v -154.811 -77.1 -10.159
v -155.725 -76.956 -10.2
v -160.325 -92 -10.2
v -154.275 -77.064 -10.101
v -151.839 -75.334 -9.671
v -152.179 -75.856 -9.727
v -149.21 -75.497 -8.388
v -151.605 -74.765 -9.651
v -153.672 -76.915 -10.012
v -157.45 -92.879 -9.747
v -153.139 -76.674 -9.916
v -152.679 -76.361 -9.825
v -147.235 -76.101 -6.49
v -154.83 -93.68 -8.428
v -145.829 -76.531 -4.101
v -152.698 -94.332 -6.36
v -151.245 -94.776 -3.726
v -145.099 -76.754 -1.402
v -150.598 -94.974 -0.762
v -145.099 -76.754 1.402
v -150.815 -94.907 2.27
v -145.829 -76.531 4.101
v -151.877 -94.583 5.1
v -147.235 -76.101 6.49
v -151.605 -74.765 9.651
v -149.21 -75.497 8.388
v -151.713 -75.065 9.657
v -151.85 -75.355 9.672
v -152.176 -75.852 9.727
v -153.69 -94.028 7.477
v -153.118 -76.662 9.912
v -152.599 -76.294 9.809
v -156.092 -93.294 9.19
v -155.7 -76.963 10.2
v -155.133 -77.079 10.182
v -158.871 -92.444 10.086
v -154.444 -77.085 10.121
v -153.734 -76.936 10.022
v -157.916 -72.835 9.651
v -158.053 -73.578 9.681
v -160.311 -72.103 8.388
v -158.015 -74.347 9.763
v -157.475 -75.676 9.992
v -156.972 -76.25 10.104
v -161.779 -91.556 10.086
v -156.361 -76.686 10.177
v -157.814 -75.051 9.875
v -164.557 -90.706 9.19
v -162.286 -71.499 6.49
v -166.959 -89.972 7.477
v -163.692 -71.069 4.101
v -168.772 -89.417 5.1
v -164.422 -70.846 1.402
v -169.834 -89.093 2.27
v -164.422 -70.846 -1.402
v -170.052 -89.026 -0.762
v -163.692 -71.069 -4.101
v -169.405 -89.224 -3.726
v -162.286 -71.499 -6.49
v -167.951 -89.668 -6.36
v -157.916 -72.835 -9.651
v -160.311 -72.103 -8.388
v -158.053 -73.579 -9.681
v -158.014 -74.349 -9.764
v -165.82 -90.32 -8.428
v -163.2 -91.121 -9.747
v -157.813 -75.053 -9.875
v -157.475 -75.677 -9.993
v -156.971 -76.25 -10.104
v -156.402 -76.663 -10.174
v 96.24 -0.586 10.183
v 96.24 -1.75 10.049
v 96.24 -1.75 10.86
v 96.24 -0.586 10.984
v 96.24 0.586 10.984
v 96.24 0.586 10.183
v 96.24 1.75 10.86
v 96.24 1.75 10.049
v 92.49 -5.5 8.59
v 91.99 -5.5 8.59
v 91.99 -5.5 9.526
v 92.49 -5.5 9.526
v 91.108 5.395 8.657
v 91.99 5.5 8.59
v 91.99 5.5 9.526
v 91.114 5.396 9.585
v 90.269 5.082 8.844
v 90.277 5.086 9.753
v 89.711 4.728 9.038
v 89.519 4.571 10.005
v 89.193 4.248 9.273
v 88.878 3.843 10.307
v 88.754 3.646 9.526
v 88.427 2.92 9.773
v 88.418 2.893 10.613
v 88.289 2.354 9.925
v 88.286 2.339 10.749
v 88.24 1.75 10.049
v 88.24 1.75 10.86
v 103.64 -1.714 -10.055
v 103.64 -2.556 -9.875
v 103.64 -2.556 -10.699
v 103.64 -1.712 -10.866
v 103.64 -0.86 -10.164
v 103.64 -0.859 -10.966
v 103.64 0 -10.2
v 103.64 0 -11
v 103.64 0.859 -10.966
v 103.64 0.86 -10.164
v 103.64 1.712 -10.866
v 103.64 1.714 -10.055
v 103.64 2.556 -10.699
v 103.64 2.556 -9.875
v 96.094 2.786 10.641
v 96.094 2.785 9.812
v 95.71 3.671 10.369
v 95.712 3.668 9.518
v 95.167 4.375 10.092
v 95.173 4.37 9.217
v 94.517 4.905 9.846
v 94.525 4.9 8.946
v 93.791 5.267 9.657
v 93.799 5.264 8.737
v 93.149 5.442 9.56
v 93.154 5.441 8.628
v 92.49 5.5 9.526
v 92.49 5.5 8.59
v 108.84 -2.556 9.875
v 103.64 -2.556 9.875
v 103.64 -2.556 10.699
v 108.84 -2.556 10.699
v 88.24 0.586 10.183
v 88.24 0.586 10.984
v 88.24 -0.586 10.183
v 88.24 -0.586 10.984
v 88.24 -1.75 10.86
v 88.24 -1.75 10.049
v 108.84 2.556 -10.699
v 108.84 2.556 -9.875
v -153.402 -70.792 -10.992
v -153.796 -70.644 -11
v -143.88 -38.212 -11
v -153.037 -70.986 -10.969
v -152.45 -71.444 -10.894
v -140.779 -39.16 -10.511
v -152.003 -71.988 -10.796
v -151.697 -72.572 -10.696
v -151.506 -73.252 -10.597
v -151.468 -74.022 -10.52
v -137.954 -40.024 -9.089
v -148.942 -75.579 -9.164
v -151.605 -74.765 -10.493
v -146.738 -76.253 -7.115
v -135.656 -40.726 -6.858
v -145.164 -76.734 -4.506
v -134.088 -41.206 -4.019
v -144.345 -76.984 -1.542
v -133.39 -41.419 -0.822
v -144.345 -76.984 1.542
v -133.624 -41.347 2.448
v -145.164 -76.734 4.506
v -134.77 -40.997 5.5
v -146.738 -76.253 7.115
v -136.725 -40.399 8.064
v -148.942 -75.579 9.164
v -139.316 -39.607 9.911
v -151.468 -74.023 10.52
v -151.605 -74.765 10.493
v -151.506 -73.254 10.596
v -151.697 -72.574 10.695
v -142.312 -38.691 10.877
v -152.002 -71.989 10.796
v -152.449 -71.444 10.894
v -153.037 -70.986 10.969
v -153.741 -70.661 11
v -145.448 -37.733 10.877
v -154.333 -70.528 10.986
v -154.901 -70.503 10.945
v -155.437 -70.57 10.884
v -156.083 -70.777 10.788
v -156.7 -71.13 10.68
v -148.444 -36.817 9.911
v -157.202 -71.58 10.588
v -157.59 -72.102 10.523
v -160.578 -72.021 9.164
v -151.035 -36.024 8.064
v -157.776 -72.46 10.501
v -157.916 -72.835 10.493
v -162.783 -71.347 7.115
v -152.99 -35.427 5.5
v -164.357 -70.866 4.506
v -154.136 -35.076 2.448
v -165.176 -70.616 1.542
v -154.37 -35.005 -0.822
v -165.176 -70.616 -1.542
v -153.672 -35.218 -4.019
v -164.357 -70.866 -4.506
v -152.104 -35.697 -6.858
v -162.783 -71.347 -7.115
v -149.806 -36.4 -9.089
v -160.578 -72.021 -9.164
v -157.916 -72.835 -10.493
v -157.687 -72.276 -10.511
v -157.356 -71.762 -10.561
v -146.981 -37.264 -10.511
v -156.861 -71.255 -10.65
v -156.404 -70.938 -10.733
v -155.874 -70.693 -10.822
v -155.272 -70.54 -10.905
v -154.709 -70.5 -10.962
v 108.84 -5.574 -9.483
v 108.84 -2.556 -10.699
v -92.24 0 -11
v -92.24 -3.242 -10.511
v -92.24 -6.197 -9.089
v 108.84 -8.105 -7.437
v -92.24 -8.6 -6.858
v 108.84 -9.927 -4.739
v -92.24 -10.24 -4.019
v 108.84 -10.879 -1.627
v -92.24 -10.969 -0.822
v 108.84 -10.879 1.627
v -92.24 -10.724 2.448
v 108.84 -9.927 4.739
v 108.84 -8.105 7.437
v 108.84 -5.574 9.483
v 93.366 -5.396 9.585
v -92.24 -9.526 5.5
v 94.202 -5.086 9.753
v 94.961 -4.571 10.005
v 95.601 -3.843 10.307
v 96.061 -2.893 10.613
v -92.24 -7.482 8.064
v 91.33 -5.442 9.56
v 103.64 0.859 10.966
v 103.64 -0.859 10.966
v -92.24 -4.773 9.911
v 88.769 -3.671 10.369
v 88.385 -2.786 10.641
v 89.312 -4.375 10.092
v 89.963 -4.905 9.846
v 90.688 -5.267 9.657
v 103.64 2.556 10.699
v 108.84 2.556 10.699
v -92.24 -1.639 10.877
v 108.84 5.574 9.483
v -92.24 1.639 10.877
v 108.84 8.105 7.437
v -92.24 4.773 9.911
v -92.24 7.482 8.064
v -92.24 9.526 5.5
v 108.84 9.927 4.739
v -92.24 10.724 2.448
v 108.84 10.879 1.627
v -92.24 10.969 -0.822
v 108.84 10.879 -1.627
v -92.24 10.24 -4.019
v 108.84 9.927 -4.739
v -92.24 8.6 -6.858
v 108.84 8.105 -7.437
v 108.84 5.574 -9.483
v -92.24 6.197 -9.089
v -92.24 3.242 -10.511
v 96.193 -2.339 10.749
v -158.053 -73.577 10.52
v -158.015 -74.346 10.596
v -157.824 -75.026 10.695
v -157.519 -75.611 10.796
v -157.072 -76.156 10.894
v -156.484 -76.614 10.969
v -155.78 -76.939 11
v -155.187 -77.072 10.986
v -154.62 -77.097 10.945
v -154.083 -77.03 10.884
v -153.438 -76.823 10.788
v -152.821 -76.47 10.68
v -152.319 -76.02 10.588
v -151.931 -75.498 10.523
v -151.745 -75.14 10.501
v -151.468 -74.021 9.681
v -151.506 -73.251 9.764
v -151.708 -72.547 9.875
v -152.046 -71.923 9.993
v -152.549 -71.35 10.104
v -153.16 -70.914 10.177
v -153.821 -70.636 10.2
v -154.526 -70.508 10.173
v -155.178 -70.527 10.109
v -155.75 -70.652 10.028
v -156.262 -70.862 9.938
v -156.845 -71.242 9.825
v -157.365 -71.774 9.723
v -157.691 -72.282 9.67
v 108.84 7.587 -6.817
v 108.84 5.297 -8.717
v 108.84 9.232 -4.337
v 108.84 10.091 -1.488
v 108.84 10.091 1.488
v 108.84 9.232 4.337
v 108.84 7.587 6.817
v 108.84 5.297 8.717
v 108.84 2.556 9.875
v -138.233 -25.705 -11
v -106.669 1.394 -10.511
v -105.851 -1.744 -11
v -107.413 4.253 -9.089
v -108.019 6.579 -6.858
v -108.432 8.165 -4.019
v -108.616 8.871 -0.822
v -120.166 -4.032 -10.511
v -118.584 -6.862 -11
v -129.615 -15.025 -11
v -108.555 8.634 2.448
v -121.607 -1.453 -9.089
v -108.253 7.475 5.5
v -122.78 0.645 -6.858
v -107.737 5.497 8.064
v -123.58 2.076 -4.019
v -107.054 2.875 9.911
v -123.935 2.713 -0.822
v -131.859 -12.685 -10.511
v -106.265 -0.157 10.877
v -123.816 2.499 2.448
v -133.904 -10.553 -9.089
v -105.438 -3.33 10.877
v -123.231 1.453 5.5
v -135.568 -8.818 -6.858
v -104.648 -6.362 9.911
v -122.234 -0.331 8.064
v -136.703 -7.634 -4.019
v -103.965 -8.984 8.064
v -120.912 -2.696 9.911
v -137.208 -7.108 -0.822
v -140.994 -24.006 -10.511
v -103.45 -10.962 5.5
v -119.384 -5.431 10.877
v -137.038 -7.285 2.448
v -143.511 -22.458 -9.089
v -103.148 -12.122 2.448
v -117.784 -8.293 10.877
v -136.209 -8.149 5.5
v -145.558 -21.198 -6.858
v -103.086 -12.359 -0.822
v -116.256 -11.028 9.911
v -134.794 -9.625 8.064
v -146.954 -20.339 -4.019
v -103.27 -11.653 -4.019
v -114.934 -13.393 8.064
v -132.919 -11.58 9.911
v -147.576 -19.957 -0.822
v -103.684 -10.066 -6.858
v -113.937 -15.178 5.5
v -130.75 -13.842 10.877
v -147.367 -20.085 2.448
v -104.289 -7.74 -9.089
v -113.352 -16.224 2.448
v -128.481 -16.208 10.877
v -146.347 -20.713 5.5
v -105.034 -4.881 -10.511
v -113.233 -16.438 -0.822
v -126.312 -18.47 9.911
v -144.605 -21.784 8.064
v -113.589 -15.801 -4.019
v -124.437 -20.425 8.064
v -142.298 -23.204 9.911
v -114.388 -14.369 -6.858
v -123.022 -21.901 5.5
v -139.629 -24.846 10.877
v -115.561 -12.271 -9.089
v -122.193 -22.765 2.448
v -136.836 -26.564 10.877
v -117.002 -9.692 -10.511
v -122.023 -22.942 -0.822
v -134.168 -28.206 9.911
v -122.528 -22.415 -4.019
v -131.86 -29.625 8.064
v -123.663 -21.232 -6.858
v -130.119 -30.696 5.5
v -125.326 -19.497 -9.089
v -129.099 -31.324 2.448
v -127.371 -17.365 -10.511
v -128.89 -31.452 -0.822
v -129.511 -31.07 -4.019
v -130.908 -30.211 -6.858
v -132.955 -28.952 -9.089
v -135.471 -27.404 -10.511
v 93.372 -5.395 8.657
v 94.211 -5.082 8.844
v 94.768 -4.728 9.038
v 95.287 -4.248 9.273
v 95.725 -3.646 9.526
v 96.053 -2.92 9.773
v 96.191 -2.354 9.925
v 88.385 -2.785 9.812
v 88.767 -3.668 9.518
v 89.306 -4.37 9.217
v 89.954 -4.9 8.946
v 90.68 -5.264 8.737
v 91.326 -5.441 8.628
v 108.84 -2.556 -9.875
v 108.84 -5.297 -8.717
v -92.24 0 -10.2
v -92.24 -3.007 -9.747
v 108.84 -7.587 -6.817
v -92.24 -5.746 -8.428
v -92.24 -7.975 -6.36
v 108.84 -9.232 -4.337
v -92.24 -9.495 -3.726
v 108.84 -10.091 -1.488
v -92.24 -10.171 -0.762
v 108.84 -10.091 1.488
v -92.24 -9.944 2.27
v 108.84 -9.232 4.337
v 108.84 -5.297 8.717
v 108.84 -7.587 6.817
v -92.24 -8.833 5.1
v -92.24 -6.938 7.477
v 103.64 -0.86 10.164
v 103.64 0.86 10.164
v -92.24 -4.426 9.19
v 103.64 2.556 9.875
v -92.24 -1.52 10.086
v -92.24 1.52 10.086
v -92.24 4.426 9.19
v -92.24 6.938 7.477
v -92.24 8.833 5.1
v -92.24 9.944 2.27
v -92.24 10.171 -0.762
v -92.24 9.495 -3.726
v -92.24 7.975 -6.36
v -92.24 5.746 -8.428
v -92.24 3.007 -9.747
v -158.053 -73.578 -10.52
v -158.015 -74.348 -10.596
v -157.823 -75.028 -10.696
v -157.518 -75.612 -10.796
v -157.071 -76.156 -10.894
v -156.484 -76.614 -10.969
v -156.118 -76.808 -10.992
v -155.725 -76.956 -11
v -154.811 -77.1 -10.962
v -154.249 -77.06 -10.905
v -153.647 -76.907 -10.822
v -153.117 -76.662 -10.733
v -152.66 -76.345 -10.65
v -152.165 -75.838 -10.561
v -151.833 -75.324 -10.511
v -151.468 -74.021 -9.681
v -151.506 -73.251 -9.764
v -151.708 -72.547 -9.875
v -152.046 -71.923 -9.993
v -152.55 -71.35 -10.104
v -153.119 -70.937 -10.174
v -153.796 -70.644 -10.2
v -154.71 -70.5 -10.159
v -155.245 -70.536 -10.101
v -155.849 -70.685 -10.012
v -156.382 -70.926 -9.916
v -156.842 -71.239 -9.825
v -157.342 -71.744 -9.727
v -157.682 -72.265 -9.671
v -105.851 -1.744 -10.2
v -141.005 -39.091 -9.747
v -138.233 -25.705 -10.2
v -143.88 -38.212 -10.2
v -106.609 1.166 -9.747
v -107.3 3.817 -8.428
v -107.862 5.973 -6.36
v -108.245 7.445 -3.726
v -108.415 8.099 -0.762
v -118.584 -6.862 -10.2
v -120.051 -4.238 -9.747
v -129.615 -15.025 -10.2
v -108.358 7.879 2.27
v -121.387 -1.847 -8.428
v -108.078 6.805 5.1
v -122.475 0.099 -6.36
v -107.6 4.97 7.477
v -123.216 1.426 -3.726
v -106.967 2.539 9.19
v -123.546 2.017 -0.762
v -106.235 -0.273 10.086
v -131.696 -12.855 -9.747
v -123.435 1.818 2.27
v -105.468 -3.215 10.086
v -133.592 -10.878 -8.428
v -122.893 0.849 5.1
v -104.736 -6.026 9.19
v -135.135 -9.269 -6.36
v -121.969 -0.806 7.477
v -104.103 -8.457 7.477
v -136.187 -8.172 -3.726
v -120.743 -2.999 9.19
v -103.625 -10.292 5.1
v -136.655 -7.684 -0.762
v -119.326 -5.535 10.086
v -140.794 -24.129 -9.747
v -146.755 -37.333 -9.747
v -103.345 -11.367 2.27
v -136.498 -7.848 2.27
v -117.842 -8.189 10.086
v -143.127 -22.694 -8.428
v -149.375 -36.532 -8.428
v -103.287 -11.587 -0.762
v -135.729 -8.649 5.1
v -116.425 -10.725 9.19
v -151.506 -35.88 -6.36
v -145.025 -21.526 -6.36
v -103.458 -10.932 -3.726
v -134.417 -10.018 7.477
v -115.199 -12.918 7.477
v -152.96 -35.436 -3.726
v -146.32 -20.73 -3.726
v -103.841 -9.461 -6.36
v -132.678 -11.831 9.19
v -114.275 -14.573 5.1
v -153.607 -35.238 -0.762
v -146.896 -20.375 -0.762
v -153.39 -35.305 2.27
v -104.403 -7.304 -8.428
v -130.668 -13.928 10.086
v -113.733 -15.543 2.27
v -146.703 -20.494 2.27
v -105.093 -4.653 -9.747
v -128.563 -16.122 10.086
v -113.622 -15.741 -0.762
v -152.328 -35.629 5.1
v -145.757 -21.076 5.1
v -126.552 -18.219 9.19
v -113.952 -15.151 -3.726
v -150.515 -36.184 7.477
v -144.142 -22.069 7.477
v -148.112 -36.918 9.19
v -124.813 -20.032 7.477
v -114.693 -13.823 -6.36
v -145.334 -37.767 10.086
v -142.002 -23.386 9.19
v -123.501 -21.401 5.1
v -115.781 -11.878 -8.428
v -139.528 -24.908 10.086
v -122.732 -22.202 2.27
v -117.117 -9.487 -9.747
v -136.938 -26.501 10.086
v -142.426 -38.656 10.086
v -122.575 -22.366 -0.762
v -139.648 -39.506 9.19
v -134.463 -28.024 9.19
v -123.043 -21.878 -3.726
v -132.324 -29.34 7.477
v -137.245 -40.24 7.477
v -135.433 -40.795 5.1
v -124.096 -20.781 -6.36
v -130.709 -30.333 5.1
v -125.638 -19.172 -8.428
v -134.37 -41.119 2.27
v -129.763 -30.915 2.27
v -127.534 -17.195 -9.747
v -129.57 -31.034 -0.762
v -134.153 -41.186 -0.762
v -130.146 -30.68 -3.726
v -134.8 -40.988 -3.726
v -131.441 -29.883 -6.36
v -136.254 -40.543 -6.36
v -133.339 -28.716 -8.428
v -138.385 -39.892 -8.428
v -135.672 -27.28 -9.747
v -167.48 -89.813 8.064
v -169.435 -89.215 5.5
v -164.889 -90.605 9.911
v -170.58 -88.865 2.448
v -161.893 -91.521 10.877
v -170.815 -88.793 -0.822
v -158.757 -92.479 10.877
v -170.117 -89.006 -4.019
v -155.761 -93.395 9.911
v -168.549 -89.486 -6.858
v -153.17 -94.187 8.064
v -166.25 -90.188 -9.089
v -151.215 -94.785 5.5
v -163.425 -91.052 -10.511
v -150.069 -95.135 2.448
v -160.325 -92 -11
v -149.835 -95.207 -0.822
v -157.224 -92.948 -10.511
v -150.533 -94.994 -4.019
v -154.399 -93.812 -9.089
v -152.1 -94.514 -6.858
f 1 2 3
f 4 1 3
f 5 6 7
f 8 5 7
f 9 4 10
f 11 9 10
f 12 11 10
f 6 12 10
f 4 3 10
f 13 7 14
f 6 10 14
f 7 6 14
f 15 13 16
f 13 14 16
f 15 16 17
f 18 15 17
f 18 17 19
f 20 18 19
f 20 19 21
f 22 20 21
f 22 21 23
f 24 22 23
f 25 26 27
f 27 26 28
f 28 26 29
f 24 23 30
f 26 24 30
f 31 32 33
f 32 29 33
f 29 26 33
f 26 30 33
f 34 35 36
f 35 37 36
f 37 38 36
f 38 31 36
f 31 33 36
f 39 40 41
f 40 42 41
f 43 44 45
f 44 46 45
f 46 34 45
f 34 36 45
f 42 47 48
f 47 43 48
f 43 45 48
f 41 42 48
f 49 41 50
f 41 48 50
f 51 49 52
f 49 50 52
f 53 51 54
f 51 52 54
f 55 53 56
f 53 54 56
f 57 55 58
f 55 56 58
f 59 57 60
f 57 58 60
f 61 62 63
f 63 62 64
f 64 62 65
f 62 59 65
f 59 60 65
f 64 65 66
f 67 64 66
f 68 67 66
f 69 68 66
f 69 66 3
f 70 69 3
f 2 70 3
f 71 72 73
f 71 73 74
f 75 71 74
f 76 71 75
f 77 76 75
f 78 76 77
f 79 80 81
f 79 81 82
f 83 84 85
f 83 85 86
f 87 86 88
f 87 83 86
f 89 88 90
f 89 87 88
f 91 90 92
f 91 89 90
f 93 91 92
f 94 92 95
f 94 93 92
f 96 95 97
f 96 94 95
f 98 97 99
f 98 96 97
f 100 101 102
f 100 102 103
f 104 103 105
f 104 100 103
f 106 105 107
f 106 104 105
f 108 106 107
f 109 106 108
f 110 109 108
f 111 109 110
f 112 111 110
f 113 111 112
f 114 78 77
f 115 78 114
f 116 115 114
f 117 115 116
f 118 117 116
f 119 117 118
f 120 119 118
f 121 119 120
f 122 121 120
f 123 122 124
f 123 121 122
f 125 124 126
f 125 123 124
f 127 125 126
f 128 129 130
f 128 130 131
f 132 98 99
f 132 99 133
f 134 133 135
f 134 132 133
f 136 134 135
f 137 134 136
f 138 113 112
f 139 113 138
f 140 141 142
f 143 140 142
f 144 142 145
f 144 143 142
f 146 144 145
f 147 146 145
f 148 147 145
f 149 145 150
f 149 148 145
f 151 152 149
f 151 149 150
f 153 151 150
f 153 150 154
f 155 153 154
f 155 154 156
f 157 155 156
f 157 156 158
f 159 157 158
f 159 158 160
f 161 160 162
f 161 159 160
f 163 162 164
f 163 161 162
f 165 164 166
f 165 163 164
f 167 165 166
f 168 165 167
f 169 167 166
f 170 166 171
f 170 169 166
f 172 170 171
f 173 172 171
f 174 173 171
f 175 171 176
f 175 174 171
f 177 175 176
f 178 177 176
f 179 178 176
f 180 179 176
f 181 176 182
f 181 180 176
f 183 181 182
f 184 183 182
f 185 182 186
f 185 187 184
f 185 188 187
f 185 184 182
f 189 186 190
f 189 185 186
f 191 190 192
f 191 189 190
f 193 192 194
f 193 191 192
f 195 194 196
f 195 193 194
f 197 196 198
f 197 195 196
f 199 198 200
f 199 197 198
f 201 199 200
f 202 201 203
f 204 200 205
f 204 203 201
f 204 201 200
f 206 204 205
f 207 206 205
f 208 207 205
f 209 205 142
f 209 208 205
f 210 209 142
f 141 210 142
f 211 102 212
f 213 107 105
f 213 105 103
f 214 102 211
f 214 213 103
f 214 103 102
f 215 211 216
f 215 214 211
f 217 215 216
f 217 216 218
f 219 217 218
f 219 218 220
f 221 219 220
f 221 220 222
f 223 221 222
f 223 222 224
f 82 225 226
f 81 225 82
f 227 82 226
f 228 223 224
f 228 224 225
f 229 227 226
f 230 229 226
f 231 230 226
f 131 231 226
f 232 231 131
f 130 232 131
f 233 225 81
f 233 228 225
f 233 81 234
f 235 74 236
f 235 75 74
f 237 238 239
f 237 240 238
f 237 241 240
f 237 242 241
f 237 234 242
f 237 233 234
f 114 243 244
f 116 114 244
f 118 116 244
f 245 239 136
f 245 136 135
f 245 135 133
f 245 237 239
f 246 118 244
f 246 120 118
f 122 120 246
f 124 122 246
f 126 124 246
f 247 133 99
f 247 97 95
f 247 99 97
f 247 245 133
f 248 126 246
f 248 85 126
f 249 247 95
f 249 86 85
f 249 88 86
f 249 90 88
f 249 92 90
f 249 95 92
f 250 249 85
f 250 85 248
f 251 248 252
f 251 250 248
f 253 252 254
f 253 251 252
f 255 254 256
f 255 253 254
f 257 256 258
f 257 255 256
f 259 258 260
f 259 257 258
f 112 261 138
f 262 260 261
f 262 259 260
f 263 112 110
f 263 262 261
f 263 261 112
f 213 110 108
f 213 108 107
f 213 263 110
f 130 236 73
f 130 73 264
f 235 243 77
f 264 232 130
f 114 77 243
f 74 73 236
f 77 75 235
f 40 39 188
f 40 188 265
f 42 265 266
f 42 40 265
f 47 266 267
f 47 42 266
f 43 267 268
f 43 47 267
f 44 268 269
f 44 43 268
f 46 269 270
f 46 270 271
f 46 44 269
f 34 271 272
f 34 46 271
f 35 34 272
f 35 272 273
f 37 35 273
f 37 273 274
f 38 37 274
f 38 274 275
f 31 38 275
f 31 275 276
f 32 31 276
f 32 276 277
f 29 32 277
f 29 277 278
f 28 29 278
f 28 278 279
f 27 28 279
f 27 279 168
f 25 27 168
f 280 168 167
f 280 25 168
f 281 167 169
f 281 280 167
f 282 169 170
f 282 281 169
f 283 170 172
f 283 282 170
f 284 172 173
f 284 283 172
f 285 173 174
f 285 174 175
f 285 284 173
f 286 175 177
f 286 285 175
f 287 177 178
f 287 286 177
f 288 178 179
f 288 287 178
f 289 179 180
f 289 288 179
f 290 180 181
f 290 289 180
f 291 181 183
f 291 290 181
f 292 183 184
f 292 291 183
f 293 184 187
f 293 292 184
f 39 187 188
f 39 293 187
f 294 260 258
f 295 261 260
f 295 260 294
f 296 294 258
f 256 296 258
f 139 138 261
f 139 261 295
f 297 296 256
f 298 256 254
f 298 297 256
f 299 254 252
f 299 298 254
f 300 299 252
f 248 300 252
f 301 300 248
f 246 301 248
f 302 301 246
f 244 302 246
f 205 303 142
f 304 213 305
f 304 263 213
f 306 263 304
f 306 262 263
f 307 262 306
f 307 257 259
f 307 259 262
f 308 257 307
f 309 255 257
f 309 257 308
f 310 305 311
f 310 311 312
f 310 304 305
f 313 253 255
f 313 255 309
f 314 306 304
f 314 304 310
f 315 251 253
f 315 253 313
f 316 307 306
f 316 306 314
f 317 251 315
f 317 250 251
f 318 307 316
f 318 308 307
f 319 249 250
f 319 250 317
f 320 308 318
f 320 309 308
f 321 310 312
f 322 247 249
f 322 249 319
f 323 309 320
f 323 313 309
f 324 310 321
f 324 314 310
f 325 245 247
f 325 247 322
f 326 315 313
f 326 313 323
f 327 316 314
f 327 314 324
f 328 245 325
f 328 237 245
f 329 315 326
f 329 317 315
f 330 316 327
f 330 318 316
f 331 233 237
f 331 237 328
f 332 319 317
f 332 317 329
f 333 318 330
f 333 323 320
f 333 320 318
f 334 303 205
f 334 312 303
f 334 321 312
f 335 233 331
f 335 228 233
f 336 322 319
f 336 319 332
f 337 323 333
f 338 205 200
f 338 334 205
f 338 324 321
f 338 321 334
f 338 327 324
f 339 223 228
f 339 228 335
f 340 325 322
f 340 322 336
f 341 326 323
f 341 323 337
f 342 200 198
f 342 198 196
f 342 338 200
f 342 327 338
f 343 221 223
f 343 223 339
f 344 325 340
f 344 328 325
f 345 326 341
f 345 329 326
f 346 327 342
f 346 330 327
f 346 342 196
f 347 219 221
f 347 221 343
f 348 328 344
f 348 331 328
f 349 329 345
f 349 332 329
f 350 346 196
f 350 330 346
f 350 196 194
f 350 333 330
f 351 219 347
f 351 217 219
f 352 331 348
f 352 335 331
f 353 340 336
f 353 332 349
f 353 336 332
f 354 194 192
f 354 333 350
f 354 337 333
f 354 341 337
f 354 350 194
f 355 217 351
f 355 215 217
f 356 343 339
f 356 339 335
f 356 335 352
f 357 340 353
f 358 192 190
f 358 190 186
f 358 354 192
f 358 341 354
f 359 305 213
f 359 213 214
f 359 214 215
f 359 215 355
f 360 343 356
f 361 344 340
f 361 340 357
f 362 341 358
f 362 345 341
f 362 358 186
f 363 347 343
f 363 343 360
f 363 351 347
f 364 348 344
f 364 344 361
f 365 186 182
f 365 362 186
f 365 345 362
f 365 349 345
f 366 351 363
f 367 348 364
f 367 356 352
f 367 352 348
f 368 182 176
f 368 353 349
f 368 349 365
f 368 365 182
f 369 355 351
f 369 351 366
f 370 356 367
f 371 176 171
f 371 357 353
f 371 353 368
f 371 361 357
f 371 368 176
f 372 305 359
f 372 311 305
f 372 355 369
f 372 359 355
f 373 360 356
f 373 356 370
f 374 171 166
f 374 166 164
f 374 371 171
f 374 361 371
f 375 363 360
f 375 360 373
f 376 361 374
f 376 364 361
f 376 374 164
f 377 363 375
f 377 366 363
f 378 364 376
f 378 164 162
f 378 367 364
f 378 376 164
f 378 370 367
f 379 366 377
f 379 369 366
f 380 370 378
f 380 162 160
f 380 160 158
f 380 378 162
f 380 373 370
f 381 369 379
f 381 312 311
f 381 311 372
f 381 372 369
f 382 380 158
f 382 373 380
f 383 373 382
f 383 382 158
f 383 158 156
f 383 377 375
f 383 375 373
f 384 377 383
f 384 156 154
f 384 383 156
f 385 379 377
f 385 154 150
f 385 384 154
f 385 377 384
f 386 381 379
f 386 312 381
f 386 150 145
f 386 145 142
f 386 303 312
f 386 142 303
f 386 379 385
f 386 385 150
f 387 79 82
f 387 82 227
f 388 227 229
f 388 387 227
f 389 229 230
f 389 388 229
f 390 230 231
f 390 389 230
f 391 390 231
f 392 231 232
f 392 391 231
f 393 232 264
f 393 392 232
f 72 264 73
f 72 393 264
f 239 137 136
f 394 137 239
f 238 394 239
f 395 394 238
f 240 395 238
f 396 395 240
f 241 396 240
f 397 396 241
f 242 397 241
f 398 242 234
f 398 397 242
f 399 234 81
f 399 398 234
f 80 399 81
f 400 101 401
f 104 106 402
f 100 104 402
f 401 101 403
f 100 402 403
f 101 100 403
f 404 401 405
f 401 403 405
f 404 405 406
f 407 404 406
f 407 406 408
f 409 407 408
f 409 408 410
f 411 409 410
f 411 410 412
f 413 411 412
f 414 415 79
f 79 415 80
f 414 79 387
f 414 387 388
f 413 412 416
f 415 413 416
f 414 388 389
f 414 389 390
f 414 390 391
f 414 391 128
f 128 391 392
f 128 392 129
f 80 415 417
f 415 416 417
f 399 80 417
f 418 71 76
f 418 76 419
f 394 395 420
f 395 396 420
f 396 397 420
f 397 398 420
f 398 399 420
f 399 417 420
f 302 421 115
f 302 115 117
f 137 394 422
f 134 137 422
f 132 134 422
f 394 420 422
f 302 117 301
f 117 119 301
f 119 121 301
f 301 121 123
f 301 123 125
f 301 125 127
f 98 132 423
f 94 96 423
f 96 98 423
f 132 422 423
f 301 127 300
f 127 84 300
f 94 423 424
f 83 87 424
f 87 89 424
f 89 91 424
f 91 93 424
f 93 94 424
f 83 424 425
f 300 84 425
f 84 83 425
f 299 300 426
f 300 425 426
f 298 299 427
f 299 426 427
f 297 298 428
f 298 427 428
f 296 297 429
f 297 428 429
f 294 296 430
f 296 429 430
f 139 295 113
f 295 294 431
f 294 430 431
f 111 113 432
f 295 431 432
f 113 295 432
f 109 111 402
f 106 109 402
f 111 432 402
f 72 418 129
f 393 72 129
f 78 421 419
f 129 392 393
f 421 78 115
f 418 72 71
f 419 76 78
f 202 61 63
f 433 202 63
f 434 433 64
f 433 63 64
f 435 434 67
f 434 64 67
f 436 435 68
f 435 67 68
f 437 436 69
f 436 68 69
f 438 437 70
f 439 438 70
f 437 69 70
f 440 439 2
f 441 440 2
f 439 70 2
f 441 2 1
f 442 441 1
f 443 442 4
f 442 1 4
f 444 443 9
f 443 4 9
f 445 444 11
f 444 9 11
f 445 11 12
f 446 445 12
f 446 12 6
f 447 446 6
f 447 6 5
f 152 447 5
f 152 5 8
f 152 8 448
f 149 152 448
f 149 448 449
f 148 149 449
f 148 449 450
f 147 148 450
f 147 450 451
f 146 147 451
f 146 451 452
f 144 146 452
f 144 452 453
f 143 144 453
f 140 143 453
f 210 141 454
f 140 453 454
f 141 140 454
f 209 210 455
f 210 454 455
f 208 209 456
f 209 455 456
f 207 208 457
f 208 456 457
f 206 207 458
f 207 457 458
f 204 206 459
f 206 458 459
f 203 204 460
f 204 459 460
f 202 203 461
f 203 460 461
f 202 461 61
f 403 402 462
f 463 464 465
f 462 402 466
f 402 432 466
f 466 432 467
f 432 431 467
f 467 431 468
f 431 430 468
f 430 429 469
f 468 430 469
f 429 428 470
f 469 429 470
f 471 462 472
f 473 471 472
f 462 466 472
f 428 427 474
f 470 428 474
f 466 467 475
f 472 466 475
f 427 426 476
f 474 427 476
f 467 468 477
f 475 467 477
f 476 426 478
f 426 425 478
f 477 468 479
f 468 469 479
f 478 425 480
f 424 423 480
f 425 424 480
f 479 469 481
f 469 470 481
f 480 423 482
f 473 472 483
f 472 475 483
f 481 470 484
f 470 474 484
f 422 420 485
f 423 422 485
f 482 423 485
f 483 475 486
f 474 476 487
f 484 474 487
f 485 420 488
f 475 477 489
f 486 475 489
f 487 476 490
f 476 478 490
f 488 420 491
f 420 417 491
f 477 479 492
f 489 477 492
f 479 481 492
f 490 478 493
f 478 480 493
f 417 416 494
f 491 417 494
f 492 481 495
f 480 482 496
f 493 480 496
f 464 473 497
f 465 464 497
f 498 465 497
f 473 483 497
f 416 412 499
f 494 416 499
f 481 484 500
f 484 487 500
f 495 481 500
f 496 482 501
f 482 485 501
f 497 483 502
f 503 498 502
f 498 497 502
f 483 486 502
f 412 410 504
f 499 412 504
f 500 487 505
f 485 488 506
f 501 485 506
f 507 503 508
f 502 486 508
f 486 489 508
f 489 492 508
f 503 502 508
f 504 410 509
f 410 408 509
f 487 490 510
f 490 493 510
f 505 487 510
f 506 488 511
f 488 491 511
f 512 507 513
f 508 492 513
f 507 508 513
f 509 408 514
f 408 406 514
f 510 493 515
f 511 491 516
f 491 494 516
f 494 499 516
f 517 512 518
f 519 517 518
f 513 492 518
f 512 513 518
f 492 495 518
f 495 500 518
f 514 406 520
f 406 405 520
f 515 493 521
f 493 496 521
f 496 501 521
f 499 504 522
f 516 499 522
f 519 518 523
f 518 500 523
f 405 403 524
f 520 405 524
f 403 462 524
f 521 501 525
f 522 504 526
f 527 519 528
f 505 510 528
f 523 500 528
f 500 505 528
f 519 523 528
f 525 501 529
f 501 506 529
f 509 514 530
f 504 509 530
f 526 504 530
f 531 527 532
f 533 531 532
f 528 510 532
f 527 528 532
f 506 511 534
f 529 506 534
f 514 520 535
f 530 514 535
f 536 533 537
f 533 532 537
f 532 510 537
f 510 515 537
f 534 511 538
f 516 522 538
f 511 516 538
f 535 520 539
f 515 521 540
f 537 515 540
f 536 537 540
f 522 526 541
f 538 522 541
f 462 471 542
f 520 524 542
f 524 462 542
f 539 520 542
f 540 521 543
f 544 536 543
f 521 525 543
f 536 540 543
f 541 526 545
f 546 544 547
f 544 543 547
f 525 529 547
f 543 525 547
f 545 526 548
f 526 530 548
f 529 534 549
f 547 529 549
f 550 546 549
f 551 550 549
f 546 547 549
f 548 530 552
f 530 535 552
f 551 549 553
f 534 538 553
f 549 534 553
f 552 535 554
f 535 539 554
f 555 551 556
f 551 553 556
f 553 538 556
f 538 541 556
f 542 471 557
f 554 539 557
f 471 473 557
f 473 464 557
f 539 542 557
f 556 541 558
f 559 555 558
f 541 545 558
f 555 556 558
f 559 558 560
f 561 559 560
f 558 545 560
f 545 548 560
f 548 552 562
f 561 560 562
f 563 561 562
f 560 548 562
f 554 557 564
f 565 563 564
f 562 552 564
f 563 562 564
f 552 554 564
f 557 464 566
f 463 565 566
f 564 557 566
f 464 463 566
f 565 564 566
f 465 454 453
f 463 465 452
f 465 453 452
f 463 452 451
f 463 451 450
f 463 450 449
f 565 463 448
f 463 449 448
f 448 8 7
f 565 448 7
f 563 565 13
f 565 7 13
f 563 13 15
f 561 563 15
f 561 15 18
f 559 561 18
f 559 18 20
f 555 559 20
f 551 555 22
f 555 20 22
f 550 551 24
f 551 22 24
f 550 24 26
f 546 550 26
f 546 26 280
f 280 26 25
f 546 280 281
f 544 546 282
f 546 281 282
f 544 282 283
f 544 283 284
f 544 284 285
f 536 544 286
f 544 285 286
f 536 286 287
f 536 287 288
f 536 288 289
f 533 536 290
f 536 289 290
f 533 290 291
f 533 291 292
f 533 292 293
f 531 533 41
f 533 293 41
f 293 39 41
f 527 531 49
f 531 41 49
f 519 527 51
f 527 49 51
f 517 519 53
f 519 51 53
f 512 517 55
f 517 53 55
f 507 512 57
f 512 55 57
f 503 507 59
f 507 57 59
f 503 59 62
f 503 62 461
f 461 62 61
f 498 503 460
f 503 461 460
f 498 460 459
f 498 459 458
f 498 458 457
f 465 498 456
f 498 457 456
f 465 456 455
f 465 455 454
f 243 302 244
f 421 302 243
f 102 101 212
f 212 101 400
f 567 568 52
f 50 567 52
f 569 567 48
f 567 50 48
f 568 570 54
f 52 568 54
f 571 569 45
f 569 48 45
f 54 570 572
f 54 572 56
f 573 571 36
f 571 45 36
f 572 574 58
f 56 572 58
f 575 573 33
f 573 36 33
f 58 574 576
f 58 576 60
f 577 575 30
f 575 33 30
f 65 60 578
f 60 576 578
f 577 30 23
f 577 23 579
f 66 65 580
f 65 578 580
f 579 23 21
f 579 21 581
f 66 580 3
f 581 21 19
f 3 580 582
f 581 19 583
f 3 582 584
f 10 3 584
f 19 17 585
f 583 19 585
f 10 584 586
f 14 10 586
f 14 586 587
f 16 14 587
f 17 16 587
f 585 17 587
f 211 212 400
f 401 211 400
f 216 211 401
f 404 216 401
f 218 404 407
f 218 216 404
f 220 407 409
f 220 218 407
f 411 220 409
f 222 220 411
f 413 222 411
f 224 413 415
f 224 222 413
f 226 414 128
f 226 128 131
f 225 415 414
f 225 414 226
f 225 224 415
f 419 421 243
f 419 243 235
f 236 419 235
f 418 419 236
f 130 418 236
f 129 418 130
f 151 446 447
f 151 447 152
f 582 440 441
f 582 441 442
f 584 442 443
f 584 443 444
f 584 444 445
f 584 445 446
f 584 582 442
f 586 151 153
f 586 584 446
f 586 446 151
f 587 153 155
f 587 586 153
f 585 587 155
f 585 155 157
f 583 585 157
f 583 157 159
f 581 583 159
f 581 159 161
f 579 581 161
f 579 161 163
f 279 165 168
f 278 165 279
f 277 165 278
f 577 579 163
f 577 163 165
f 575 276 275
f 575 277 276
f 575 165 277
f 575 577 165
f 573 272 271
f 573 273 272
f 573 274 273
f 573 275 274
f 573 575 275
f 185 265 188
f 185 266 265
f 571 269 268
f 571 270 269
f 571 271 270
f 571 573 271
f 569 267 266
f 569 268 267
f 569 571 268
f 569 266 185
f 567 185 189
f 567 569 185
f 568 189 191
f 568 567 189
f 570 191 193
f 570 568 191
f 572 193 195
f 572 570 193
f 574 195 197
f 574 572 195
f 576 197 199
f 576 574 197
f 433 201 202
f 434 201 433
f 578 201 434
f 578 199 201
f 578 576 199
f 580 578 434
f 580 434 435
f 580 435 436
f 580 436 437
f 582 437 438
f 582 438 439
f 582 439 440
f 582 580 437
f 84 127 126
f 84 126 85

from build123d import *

# Parameters (mm, degrees)
SKETCH3_R          = 11
SKETCH3_R_2        = 10.2
CUT_EXTRUDE1_REACH = 197.895
SKETCH4_R          = 3.3
SKETCH5_R          = 3.3
CUT_EXTRUDE2_DEPTH = 196.894862351
SKETCH6_W          = 5.2
SKETCH6_H          = 5.111091306
CUT_EXTRUDE3_DEPTH = 196.894862351


with BuildPart() as part:
    # Sweep2: sweep along a path in Sketch1
    with BuildLine(Plane.XY) as sweep2_path:
        Line((108.839588828, 0), (92.239588828, 0))
        Line((92.239588828, 0), (-92.239588828, 0))
        ThreePointArc((-92.239588828, 0), (-124.360019313, -10.591729527), (-143.88004565, -38.211927945))
        Line((-143.88004565, -38.211927945), (-154.760411172, -73.8))
        Line((-154.760411172, -73.8), (-160.324709574, -92))
    # Sketch3 → Sweep2 (sweep)
    with BuildSketch(Plane(origin=(92.239588828, 0, 0), x_dir=(0, 0, -1), z_dir=(1, 0, 0))):
        Circle(SKETCH3_R)
        Circle(SKETCH3_R_2, mode=Mode.SUBTRACT)
    sweep(path=sweep2_path.line)

    # Sketch4 → Cut-Extrude1 (cut, up to next)
    with BuildSketch(Plane.XY, mode=Mode.PRIVATE) as cut_extrude1_sk1:
        with Locations((-154.760411172, -73.8)):
            Circle(SKETCH4_R)
    cut_extrude1_tool1 = extrude(cut_extrude1_sk1.sketch, amount=CUT_EXTRUDE1_REACH, mode=Mode.PRIVATE) & part.part
    # Sketch4 → Cut-Extrude1 (cut, up to next)
    with BuildSketch(Plane.XY, mode=Mode.PRIVATE) as cut_extrude1_sk2:
        Polygon((108.839588828, 2.555545653), (108.839588828, -2.555545653), (105.639588828, -2.555545653), (103.639588828, -2.555545653), (103.639588828, -0.555545653), (103.639588828, 0.555545653), (103.639588828, 2.555545653), (105.639588828, 2.555545653), align=None)
    cut_extrude1_tool2 = extrude(cut_extrude1_sk2.sketch, amount=CUT_EXTRUDE1_REACH, mode=Mode.PRIVATE) & part.part
    # Sketch4 → Cut-Extrude1 (cut, up to next)
    with BuildSketch(Plane.XY, mode=Mode.PRIVATE) as cut_extrude1_sk3:
        with BuildLine():
            Line((91.989588828, -5.5), (92.489588828, -5.5))
            ThreePointArc((92.489588828, -5.5), (95.141239258, -4.401650429), (96.239588828, -1.75))
            Line((96.239588828, -1.75), (96.239588828, 1.75))
            ThreePointArc((96.239588828, 1.75), (95.141239258, 4.401650429), (92.489588828, 5.5))
            Line((92.489588828, 5.5), (91.989588828, 5.5))
            ThreePointArc((91.989588828, 5.5), (89.337938399, 4.401650429), (88.239588828, 1.75))
            Line((88.239588828, 1.75), (88.239588828, -1.75))
            ThreePointArc((88.239588828, -1.75), (89.337938399, -4.401650429), (91.989588828, -5.5))
        make_face()
    cut_extrude1_tool3 = extrude(cut_extrude1_sk3.sketch, amount=CUT_EXTRUDE1_REACH, mode=Mode.PRIVATE) & part.part
    add(cut_extrude1_tool1.solids().sort_by_distance((-154.760411, -73.8, 0))[0], mode=Mode.SUBTRACT)
    add(cut_extrude1_tool2.solids().sort_by_distance((106.239589, 0, 0))[0], mode=Mode.SUBTRACT)
    add(cut_extrude1_tool3.solids().sort_by_distance((92.239589, 0, 0))[0], mode=Mode.SUBTRACT)

    # Sketch5 → Cut-Extrude2 (cut, through all)
    with BuildSketch(Plane.XY):
        with Locations((-154.760411172, -73.8)):
            Circle(SKETCH5_R)
    extrude(amount=-CUT_EXTRUDE2_DEPTH, mode=Mode.SUBTRACT)

    # Sketch6 → Cut-Extrude3 (cut, through all)
    with BuildSketch(Plane.XY):
        with Locations((106.239588828, 0)):
            Rectangle(SKETCH6_W, SKETCH6_H)
    extrude(amount=-CUT_EXTRUDE3_DEPTH, mode=Mode.SUBTRACT)


solid = part.part
